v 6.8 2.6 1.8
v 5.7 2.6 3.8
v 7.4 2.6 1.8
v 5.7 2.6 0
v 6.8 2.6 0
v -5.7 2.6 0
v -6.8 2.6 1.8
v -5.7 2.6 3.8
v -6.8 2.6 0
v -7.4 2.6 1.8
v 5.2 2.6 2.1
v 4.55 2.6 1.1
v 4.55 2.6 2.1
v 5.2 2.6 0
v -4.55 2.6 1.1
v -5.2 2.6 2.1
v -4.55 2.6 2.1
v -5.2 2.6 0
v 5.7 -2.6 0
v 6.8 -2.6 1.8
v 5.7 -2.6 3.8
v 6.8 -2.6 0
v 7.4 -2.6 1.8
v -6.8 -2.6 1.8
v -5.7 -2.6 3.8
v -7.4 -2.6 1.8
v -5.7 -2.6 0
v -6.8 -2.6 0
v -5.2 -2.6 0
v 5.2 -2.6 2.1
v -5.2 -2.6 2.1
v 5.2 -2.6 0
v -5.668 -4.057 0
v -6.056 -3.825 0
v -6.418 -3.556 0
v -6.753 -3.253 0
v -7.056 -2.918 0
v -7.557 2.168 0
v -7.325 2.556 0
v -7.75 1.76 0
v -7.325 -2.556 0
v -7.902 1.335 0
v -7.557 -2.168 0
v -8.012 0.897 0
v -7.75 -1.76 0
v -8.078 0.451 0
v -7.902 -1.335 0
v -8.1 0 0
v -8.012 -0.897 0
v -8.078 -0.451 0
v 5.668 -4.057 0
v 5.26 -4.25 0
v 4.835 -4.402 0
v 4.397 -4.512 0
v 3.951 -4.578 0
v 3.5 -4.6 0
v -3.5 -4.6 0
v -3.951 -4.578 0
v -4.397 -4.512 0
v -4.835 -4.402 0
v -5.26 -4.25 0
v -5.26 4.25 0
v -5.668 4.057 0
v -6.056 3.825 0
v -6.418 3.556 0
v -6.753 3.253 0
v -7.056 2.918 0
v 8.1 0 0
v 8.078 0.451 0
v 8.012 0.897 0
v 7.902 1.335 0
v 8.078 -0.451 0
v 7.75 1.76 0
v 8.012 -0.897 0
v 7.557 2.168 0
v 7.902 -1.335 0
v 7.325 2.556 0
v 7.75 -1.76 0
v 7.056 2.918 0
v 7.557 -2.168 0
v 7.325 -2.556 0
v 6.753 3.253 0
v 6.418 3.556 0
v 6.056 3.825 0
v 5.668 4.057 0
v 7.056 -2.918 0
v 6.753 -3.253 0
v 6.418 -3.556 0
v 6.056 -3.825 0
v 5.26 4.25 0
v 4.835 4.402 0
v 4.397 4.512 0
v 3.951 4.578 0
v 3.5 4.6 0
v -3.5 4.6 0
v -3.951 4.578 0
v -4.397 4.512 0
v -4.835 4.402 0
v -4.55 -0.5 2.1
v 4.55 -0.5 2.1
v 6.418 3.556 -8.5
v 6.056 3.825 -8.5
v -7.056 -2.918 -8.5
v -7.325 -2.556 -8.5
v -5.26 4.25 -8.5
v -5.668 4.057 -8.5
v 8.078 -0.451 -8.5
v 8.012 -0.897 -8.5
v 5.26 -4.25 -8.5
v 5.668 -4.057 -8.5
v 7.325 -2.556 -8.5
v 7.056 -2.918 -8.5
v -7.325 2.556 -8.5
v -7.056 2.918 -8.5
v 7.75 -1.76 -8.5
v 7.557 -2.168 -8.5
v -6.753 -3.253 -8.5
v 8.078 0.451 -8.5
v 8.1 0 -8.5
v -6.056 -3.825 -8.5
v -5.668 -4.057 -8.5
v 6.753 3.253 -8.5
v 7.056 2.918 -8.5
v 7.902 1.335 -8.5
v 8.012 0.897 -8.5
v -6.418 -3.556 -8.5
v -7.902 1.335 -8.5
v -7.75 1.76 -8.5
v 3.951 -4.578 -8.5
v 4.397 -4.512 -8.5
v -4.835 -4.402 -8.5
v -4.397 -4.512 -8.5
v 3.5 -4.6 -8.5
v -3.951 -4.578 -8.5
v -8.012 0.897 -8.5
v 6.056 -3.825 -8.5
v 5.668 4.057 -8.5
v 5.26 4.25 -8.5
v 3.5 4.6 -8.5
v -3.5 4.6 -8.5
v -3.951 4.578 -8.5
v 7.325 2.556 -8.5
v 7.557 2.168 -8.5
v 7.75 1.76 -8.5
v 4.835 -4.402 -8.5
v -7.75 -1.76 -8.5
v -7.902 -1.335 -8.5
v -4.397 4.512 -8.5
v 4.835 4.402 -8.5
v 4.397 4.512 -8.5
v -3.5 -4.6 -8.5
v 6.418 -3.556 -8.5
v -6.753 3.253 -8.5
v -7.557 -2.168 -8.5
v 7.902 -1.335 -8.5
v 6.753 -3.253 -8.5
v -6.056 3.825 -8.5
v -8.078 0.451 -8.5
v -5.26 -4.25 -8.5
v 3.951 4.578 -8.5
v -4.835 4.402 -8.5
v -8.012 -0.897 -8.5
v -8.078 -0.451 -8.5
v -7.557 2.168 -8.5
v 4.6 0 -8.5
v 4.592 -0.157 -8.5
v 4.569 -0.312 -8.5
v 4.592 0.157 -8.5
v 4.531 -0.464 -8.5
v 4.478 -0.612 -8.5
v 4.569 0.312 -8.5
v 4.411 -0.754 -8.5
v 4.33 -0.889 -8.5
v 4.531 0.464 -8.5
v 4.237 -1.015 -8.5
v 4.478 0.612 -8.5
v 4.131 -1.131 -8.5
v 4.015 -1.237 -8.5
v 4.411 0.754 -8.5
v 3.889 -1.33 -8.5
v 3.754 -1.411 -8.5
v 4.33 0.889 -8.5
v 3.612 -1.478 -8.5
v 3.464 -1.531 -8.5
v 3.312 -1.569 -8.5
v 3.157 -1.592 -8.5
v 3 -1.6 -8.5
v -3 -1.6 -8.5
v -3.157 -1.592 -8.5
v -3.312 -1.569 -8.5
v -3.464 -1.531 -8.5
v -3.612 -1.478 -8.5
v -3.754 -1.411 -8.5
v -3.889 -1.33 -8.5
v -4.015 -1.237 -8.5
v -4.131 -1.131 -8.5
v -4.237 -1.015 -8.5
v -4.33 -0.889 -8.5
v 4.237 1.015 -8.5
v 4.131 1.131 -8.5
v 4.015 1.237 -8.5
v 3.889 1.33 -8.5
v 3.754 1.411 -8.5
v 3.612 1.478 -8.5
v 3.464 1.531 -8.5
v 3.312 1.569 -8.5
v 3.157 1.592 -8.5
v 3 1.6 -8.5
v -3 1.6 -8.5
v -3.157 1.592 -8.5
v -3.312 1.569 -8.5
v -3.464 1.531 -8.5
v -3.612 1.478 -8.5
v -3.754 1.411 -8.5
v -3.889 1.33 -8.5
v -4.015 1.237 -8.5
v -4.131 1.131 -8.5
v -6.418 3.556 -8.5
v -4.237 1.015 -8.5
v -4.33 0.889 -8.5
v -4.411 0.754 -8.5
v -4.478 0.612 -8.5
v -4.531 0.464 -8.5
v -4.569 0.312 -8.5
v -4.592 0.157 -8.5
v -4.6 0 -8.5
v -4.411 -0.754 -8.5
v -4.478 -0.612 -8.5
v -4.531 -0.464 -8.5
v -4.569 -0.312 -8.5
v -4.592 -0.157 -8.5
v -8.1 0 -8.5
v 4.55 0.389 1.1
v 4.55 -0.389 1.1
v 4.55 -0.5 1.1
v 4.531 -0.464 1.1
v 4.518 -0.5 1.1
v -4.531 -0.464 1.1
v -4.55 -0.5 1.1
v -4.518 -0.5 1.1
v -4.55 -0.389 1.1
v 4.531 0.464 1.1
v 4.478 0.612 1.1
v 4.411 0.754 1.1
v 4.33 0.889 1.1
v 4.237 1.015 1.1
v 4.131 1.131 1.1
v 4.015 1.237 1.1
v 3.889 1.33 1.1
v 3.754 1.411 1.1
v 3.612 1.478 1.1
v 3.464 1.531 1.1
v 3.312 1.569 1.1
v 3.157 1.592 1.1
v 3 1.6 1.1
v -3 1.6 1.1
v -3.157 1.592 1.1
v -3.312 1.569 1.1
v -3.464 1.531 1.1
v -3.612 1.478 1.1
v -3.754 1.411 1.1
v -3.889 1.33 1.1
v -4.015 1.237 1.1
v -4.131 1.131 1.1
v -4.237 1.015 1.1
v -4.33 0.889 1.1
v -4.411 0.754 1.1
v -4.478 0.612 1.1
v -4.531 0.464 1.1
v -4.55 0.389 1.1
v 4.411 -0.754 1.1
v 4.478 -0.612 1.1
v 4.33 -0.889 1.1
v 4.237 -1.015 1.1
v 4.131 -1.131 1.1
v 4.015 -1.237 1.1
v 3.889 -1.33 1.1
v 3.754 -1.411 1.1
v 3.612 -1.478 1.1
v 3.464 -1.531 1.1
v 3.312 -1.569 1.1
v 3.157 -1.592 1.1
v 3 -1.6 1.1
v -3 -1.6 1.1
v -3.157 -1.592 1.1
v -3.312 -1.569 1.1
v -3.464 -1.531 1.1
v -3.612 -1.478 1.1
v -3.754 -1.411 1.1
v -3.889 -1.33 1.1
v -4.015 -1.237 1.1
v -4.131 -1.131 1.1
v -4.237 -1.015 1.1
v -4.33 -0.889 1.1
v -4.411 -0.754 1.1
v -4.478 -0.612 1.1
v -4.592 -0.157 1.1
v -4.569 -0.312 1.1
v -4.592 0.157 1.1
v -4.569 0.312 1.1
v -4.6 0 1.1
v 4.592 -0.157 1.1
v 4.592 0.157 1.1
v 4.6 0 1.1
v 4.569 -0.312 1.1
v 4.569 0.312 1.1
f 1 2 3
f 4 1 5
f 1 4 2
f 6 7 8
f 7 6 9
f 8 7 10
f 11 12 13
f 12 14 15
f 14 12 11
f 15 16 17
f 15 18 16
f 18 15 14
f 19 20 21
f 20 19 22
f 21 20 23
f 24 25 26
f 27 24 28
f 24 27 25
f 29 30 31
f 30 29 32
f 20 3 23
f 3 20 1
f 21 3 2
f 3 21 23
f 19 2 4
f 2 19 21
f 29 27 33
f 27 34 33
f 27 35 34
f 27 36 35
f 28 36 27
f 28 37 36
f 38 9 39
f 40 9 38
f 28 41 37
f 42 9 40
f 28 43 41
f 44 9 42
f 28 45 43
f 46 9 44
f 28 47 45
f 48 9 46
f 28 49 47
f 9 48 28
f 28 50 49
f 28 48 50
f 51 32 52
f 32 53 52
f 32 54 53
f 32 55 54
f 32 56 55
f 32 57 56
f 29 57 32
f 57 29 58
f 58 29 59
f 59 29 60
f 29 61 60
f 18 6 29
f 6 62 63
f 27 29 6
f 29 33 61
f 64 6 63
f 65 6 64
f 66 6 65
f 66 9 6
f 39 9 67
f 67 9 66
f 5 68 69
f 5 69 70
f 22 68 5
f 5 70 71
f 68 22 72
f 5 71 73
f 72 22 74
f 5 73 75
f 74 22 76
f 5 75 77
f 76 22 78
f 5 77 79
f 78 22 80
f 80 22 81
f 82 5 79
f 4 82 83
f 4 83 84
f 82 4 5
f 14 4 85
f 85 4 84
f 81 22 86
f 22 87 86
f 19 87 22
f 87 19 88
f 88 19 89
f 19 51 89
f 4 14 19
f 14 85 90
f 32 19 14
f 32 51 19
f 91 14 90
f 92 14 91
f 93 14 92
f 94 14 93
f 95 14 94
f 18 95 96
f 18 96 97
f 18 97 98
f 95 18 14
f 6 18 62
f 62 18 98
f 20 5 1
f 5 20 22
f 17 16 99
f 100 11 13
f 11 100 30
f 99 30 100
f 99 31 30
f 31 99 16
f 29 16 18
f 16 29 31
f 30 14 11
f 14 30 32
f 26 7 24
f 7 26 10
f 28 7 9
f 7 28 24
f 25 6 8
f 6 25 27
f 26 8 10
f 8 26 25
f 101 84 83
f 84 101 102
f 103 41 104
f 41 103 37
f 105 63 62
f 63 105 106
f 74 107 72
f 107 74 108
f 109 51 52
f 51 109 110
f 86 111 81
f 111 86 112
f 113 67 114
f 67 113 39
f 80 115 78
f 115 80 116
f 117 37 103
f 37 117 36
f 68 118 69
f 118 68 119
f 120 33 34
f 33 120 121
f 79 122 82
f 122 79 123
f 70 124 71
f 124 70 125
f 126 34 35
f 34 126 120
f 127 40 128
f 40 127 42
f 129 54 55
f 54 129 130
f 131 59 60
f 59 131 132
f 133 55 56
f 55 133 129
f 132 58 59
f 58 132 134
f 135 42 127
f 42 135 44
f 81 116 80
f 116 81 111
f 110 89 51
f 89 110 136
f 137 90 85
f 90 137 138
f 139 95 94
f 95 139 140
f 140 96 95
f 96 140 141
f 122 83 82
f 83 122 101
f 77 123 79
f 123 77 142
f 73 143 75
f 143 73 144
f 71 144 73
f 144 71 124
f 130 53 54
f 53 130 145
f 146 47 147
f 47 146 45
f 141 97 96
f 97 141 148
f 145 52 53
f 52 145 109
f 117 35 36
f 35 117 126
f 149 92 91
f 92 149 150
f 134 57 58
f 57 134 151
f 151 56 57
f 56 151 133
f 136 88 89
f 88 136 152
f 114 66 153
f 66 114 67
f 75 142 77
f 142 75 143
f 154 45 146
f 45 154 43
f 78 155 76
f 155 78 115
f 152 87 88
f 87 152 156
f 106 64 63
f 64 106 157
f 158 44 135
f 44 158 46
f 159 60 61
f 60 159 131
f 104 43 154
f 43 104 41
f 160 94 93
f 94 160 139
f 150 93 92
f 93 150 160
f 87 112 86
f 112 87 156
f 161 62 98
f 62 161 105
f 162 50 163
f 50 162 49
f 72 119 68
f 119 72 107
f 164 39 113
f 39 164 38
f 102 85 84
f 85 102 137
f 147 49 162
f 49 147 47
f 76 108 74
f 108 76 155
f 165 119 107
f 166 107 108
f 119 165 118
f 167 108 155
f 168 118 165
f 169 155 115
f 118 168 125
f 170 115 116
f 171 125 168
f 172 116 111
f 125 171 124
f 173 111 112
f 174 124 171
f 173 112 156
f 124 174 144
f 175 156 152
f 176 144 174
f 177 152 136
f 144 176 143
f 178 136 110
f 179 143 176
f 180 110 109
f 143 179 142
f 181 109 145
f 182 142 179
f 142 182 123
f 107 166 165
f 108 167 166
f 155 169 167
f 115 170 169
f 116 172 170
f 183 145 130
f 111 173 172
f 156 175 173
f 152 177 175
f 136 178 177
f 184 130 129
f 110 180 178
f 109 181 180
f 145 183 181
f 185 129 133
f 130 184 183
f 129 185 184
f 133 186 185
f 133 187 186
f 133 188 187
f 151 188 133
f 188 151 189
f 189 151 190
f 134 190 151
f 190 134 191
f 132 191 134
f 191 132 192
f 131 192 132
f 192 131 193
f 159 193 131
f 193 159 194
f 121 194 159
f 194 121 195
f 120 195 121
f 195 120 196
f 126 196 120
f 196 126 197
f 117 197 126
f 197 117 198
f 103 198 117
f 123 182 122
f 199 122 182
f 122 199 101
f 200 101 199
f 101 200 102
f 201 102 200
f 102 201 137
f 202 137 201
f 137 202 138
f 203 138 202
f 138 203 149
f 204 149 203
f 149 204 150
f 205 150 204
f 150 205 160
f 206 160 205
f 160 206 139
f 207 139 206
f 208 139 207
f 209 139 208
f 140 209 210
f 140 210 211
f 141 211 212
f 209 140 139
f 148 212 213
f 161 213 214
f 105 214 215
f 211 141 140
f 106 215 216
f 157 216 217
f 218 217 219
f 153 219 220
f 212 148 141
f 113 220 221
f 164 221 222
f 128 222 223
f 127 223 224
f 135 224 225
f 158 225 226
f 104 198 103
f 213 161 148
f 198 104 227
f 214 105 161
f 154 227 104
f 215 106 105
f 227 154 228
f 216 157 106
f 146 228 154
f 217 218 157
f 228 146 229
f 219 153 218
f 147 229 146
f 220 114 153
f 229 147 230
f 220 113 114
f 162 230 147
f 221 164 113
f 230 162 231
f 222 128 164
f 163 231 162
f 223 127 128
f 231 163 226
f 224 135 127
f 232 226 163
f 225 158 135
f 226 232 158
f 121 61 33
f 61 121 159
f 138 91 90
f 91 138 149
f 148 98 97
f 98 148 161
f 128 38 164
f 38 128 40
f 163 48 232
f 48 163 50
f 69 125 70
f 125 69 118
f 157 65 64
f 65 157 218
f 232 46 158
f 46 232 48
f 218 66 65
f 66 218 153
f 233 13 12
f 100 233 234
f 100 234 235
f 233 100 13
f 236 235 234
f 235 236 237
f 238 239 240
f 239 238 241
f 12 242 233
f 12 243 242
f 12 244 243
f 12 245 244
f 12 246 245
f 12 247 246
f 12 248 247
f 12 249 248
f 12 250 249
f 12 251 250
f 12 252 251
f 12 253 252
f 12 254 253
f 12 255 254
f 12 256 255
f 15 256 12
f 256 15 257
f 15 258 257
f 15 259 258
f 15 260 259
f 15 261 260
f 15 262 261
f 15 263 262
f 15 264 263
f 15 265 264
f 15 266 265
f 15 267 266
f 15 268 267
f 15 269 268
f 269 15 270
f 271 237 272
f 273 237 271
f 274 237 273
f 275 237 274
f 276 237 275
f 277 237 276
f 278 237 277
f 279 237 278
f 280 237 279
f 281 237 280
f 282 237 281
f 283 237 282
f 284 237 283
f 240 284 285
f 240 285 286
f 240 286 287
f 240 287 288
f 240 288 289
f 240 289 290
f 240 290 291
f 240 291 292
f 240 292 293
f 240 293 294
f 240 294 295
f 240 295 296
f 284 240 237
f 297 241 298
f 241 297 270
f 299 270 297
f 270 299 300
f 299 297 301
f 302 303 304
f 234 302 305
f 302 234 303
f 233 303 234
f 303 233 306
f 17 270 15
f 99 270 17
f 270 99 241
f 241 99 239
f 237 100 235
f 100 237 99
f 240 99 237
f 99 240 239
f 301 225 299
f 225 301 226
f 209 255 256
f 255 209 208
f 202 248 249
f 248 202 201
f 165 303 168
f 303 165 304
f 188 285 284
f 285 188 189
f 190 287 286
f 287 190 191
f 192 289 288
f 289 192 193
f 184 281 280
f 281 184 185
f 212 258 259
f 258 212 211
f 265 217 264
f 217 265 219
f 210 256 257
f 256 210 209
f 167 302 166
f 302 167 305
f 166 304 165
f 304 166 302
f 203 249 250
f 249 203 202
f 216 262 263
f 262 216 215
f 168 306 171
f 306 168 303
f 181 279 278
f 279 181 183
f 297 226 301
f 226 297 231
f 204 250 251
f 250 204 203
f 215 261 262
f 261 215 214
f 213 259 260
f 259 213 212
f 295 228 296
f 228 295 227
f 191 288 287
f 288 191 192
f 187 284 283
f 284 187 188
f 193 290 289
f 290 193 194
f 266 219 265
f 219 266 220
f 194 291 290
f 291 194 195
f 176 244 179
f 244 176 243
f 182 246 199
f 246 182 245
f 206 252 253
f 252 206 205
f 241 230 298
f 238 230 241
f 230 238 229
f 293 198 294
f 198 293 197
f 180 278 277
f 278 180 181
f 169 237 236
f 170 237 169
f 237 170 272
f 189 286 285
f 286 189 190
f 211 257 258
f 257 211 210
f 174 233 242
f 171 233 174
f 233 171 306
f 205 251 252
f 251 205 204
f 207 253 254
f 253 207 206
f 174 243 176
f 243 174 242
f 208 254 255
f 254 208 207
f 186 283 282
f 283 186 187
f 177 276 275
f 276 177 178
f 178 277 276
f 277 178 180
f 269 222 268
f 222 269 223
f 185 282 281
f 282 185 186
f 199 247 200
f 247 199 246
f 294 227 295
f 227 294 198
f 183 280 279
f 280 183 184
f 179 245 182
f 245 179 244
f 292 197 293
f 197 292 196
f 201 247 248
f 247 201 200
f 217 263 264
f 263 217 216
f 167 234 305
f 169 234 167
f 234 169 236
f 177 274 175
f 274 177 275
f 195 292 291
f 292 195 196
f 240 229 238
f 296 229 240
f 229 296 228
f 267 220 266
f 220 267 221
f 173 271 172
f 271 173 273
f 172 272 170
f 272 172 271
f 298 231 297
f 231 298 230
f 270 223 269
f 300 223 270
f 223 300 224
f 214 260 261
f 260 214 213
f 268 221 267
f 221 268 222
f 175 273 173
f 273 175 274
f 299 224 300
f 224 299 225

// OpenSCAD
$fn=64;


port_width = 9.2;
port_length = 10.6;
port_radius = 1.6;

pcb_width = 9.1;
pcb_thickness = 1;
pcb_cover_length = 1;

wall_thickness = 1.8;
latch_overhang = 0.6;
latch_height = 2;
latch_gap = 0.5;
latch_width = 1.1;

sleeve_width = port_width + 1.2;
sleeve_thickness = port_radius * 2 + 2;

top_gap = 1;
top_thickness = 8.5;
top_border = 3;
top_width = port_width + 2*top_border+1;
top_radius = port_radius + top_border;


outer_x = sleeve_width/2 + latch_gap + latch_width;
outer_y = port_length - top_thickness - top_gap + pcb_cover_length;

echo(outer_x*2);
echo(sleeve_thickness);

module pillinder(width, radius, height) {
  hull() {
    translate([width/2 - radius, 0, 0])
    cylinder(h=height, r=radius);
    translate([-width/2 + radius, 0, 0])
    cylinder(h=height, r=radius);
  }
}
    

difference() {
union() {
  rotate([90,0,0])
  translate([0, 0, -sleeve_thickness/2])
  linear_extrude(sleeve_thickness)
  polygon([
    [-outer_x, 0],
    [-outer_x, wall_thickness],
    [-outer_x - latch_overhang, wall_thickness],
    [-outer_x + latch_width, wall_thickness + latch_height],
    [-outer_x + latch_width, 0],
    [-sleeve_width/2, 0],
    [-sleeve_width/2, outer_y],
    [sleeve_width/2, outer_y],
    [sleeve_width/2, 0],
    [outer_x - latch_width, 0],
    [outer_x - latch_width, wall_thickness + latch_height],
    [outer_x + latch_overhang, wall_thickness],
    [outer_x, wall_thickness],
    [outer_x, 0],
  ]);

  translate([0,0,-top_thickness])
  pillinder(top_width, top_radius, top_thickness);
}

  translate([0, 0, port_length -top_thickness -top_gap + pcb_cover_length/2+1])
  cube([pcb_width, pcb_thickness, pcb_cover_length+2], center=true);

  translate([0, 4, port_length -top_thickness -top_gap + pcb_cover_length/2])
  cube([pcb_width, 8, pcb_cover_length], center=true);

  translate([0, 0, -top_thickness -top_gap])
  pillinder(port_width, port_radius, port_length);
}
